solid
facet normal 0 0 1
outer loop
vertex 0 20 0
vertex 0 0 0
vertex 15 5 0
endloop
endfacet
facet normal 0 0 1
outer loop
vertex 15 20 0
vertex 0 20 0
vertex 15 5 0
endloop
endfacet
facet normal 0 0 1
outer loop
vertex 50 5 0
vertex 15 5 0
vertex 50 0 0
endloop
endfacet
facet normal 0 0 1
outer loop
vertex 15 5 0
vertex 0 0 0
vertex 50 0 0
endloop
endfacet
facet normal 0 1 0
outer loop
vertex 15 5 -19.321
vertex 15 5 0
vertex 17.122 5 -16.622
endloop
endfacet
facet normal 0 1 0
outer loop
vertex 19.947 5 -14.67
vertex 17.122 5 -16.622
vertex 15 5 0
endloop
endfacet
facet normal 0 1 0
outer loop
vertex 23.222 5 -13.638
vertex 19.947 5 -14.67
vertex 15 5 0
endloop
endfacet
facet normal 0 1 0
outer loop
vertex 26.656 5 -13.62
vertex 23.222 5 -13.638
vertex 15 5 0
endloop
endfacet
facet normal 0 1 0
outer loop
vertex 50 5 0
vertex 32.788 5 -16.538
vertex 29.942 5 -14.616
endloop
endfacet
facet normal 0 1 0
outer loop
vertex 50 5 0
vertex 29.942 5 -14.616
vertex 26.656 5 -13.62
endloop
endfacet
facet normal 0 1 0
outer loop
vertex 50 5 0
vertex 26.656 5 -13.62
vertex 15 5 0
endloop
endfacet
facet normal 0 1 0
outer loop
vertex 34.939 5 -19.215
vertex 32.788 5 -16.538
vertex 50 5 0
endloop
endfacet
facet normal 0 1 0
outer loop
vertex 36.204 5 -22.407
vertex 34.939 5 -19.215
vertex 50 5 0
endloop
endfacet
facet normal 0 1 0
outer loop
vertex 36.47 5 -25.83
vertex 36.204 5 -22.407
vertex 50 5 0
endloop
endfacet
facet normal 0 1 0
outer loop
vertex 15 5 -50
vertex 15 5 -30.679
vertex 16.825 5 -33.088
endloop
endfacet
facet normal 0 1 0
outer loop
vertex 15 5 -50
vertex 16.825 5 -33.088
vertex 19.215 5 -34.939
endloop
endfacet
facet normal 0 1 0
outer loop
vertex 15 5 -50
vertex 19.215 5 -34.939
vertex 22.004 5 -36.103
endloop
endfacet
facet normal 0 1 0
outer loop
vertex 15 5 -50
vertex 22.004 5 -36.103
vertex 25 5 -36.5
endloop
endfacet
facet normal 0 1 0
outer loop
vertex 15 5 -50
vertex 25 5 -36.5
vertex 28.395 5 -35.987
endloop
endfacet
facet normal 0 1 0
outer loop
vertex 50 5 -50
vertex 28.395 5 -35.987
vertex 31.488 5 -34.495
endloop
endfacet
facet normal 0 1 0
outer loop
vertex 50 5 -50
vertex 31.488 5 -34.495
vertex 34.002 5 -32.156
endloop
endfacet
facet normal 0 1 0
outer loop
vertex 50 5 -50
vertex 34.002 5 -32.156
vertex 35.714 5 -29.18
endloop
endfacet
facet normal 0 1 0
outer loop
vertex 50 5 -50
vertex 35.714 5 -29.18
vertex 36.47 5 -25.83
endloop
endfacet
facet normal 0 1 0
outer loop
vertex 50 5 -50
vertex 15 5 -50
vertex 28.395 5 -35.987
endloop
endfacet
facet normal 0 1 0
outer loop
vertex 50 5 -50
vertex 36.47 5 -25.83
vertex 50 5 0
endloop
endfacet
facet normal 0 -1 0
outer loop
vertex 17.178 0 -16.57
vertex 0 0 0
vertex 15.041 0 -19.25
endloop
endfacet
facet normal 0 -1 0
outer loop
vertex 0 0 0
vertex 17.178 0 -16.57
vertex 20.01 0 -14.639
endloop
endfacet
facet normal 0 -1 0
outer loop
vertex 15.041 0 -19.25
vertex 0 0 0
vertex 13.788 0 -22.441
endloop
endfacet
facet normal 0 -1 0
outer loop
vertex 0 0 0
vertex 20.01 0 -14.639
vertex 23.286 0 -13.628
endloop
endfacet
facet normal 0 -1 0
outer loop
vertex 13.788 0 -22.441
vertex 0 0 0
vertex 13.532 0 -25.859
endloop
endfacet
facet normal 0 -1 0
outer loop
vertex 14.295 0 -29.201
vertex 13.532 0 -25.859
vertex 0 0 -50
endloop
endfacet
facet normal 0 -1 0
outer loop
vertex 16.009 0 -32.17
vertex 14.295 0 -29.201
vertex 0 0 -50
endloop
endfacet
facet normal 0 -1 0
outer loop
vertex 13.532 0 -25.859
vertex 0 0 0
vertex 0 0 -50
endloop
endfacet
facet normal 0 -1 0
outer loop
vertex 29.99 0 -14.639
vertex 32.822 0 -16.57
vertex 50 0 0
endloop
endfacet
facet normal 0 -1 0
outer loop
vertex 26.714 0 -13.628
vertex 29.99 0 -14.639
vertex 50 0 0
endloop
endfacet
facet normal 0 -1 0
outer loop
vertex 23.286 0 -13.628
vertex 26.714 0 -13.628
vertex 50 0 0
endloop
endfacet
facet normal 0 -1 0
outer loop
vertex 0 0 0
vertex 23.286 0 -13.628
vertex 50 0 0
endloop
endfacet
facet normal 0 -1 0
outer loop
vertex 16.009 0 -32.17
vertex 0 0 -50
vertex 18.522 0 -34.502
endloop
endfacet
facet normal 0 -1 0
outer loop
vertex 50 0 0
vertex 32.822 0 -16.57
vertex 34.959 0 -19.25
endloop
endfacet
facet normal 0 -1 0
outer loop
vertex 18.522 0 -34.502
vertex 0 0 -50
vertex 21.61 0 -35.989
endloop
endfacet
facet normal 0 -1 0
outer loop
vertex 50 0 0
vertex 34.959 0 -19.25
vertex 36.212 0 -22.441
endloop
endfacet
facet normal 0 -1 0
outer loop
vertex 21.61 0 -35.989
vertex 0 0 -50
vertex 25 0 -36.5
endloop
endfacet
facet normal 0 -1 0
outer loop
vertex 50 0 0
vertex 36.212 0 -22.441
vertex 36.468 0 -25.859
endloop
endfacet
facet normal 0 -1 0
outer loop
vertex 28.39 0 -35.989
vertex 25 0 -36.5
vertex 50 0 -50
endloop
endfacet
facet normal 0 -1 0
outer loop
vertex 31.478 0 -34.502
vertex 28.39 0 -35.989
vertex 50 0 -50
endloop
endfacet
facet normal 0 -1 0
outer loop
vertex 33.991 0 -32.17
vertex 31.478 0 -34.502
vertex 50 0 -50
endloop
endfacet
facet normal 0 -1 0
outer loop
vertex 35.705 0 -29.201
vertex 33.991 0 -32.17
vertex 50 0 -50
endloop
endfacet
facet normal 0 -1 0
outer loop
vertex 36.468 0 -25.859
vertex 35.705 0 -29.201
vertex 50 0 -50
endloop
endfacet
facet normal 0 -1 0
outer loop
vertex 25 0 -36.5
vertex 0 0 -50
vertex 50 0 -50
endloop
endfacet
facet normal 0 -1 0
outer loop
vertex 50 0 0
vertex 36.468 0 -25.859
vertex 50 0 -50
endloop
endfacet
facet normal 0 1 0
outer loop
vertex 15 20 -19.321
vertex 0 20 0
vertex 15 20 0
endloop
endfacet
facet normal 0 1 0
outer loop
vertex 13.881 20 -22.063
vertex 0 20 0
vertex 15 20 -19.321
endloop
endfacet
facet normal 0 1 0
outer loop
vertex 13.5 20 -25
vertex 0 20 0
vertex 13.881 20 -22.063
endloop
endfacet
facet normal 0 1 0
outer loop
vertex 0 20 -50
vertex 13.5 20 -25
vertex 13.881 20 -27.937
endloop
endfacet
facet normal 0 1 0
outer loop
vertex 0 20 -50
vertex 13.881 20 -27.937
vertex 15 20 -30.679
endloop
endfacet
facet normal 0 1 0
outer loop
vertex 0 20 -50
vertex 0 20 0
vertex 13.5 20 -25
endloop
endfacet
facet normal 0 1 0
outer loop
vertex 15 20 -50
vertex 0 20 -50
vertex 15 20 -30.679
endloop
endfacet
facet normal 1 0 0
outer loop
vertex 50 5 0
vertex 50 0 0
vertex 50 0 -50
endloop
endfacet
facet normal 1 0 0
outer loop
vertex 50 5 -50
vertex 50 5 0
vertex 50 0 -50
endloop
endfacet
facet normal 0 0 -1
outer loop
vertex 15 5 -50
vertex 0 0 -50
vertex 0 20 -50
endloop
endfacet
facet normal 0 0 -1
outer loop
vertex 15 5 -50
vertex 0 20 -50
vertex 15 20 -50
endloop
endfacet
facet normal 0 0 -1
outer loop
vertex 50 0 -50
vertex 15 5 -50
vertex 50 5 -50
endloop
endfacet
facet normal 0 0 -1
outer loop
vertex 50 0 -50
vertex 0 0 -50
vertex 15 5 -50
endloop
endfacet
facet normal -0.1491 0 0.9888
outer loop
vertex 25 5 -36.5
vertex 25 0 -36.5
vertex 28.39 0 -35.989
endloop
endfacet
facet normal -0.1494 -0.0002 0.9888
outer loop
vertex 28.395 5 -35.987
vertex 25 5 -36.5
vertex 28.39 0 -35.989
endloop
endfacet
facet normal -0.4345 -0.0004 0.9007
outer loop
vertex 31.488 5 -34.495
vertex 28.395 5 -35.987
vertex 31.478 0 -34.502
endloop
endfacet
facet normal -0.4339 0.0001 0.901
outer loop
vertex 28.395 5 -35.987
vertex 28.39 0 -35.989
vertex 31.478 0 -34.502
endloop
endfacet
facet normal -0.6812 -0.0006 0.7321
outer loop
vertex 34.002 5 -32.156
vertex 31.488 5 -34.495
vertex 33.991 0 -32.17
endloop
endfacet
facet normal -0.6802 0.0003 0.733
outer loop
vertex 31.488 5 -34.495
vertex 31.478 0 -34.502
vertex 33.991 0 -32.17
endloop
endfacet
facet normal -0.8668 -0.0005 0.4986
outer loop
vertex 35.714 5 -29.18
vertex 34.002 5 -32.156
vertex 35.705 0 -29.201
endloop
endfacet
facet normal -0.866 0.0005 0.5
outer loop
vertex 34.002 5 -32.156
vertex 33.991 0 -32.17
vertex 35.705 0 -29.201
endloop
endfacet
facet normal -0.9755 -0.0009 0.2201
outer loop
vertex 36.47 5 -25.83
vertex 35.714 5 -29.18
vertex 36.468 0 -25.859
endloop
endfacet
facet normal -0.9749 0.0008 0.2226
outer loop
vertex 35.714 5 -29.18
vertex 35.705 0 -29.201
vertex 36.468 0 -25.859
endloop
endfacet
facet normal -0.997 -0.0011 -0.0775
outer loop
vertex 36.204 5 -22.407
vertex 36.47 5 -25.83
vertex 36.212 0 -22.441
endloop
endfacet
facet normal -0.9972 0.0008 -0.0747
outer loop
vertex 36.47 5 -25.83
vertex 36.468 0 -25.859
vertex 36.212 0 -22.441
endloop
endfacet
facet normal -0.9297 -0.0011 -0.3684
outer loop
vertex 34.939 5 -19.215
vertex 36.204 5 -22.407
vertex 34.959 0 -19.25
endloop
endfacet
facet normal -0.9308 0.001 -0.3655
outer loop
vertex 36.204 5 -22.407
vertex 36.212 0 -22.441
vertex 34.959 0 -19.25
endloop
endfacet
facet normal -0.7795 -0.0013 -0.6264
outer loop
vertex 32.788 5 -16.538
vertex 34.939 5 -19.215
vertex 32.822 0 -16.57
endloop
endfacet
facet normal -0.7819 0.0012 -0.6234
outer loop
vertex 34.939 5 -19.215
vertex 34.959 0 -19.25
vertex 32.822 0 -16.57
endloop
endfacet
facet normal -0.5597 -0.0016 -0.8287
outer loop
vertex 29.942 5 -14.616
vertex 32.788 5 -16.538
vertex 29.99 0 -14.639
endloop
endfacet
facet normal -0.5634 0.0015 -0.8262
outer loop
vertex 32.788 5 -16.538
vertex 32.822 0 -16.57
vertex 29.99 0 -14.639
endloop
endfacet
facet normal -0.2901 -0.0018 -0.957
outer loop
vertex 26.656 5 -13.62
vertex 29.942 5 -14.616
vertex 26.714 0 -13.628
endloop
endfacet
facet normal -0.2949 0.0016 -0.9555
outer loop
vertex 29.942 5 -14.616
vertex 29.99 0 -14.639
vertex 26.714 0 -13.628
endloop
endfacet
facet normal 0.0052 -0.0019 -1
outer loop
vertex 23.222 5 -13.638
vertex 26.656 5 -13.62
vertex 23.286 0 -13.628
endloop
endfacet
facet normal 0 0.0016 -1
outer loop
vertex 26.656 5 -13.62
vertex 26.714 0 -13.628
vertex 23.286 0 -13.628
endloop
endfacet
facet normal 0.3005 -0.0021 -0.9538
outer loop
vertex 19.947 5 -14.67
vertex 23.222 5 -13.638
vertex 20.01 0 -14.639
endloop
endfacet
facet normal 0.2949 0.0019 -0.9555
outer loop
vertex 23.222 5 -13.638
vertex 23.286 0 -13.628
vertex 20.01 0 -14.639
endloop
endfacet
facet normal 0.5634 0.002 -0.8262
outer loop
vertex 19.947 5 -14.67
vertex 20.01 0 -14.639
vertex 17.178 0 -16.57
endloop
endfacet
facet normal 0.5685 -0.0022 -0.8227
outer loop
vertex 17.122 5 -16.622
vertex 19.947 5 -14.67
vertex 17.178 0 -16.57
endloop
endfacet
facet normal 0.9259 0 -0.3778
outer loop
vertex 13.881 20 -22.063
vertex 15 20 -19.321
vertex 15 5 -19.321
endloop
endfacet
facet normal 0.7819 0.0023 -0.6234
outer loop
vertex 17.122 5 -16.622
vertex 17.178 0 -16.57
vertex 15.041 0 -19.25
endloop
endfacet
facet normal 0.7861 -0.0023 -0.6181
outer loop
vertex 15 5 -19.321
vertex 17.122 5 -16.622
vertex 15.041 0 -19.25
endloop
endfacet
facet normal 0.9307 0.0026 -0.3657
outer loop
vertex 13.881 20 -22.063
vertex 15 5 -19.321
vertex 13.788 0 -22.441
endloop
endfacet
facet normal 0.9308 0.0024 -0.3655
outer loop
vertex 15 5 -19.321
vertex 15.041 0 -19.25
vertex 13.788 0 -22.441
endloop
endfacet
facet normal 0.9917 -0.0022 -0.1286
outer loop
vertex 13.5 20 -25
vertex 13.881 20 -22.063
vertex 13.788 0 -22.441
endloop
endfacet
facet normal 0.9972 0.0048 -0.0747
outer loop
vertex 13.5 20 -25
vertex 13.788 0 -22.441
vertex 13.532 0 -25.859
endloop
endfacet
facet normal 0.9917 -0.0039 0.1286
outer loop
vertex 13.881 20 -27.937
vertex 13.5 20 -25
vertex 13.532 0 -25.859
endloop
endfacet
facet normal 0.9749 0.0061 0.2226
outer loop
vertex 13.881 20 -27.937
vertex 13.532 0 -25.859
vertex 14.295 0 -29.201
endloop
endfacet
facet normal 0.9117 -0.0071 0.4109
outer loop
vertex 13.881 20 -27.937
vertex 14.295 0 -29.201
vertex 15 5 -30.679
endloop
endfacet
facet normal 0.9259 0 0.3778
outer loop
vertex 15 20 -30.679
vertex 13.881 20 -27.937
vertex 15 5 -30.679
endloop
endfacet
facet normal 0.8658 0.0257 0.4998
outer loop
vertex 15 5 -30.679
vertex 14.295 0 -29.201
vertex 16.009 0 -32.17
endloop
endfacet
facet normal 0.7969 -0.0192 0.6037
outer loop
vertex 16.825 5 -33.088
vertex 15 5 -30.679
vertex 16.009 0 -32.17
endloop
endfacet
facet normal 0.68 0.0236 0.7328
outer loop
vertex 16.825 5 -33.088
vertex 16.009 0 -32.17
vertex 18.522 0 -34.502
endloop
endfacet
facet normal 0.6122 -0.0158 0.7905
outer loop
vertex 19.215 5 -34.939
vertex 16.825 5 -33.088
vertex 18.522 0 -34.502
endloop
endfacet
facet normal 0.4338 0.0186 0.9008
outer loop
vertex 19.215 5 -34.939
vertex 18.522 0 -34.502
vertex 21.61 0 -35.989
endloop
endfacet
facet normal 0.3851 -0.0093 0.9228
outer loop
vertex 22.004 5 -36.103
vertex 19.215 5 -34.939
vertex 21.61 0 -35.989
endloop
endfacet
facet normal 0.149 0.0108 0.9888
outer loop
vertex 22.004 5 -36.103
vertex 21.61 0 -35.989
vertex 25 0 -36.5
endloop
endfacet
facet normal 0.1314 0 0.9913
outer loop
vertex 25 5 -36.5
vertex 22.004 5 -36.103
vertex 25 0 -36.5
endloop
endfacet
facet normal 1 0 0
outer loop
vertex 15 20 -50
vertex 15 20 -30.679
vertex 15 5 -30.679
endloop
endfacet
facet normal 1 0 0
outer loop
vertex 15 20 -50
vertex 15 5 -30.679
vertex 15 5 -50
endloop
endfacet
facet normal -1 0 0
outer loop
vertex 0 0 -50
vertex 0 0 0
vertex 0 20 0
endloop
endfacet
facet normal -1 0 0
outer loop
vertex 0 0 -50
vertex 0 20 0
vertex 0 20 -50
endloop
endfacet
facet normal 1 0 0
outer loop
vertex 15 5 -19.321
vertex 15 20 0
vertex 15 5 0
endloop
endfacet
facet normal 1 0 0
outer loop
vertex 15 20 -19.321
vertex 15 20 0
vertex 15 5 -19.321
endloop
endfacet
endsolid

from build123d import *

# Parameters (mm, degrees)
SKETCH1_W           = 50
SKETCH1_H           = 50
BOSS_EXTRUDE1_DEPTH = 20
SKETCH2_R           = 11.5
CUT_EXTRUDE1_DEPTH  = 74.484692283
SKETCH3_W           = 38.473106937
SKETCH3_H           = 58.925618974
CUT_EXTRUDE2_DEPTH  = 15


with BuildPart() as part:
    # Sketch1 → Boss-Extrude1 (new body)
    with BuildSketch(Plane(origin=(0, 0, 0), x_dir=(1, 0, 0), z_dir=(0, 1, 0))):
        with Locations((25, 25)):
            Rectangle(SKETCH1_W, SKETCH1_H)
    extrude(amount=BOSS_EXTRUDE1_DEPTH)

    # Sketch2 → Cut-Extrude1 (cut, through all)
    with BuildSketch(Plane.XZ):
        with Locations(Location((25, -25, 0), (0, 0, 270))):
            Circle(SKETCH2_R)
    extrude(amount=-CUT_EXTRUDE1_DEPTH, mode=Mode.SUBTRACT)

    # Sketch3 → Cut-Extrude2 (cut)
    with BuildSketch(Plane(origin=(0, 20, 0), x_dir=(1, 0, 0), z_dir=(0, 1, 0))):
        with Locations((34.236553469, 26.583369284)):
            Rectangle(SKETCH3_W, SKETCH3_H)
    extrude(amount=-CUT_EXTRUDE2_DEPTH, mode=Mode.SUBTRACT)


solid = part.part
